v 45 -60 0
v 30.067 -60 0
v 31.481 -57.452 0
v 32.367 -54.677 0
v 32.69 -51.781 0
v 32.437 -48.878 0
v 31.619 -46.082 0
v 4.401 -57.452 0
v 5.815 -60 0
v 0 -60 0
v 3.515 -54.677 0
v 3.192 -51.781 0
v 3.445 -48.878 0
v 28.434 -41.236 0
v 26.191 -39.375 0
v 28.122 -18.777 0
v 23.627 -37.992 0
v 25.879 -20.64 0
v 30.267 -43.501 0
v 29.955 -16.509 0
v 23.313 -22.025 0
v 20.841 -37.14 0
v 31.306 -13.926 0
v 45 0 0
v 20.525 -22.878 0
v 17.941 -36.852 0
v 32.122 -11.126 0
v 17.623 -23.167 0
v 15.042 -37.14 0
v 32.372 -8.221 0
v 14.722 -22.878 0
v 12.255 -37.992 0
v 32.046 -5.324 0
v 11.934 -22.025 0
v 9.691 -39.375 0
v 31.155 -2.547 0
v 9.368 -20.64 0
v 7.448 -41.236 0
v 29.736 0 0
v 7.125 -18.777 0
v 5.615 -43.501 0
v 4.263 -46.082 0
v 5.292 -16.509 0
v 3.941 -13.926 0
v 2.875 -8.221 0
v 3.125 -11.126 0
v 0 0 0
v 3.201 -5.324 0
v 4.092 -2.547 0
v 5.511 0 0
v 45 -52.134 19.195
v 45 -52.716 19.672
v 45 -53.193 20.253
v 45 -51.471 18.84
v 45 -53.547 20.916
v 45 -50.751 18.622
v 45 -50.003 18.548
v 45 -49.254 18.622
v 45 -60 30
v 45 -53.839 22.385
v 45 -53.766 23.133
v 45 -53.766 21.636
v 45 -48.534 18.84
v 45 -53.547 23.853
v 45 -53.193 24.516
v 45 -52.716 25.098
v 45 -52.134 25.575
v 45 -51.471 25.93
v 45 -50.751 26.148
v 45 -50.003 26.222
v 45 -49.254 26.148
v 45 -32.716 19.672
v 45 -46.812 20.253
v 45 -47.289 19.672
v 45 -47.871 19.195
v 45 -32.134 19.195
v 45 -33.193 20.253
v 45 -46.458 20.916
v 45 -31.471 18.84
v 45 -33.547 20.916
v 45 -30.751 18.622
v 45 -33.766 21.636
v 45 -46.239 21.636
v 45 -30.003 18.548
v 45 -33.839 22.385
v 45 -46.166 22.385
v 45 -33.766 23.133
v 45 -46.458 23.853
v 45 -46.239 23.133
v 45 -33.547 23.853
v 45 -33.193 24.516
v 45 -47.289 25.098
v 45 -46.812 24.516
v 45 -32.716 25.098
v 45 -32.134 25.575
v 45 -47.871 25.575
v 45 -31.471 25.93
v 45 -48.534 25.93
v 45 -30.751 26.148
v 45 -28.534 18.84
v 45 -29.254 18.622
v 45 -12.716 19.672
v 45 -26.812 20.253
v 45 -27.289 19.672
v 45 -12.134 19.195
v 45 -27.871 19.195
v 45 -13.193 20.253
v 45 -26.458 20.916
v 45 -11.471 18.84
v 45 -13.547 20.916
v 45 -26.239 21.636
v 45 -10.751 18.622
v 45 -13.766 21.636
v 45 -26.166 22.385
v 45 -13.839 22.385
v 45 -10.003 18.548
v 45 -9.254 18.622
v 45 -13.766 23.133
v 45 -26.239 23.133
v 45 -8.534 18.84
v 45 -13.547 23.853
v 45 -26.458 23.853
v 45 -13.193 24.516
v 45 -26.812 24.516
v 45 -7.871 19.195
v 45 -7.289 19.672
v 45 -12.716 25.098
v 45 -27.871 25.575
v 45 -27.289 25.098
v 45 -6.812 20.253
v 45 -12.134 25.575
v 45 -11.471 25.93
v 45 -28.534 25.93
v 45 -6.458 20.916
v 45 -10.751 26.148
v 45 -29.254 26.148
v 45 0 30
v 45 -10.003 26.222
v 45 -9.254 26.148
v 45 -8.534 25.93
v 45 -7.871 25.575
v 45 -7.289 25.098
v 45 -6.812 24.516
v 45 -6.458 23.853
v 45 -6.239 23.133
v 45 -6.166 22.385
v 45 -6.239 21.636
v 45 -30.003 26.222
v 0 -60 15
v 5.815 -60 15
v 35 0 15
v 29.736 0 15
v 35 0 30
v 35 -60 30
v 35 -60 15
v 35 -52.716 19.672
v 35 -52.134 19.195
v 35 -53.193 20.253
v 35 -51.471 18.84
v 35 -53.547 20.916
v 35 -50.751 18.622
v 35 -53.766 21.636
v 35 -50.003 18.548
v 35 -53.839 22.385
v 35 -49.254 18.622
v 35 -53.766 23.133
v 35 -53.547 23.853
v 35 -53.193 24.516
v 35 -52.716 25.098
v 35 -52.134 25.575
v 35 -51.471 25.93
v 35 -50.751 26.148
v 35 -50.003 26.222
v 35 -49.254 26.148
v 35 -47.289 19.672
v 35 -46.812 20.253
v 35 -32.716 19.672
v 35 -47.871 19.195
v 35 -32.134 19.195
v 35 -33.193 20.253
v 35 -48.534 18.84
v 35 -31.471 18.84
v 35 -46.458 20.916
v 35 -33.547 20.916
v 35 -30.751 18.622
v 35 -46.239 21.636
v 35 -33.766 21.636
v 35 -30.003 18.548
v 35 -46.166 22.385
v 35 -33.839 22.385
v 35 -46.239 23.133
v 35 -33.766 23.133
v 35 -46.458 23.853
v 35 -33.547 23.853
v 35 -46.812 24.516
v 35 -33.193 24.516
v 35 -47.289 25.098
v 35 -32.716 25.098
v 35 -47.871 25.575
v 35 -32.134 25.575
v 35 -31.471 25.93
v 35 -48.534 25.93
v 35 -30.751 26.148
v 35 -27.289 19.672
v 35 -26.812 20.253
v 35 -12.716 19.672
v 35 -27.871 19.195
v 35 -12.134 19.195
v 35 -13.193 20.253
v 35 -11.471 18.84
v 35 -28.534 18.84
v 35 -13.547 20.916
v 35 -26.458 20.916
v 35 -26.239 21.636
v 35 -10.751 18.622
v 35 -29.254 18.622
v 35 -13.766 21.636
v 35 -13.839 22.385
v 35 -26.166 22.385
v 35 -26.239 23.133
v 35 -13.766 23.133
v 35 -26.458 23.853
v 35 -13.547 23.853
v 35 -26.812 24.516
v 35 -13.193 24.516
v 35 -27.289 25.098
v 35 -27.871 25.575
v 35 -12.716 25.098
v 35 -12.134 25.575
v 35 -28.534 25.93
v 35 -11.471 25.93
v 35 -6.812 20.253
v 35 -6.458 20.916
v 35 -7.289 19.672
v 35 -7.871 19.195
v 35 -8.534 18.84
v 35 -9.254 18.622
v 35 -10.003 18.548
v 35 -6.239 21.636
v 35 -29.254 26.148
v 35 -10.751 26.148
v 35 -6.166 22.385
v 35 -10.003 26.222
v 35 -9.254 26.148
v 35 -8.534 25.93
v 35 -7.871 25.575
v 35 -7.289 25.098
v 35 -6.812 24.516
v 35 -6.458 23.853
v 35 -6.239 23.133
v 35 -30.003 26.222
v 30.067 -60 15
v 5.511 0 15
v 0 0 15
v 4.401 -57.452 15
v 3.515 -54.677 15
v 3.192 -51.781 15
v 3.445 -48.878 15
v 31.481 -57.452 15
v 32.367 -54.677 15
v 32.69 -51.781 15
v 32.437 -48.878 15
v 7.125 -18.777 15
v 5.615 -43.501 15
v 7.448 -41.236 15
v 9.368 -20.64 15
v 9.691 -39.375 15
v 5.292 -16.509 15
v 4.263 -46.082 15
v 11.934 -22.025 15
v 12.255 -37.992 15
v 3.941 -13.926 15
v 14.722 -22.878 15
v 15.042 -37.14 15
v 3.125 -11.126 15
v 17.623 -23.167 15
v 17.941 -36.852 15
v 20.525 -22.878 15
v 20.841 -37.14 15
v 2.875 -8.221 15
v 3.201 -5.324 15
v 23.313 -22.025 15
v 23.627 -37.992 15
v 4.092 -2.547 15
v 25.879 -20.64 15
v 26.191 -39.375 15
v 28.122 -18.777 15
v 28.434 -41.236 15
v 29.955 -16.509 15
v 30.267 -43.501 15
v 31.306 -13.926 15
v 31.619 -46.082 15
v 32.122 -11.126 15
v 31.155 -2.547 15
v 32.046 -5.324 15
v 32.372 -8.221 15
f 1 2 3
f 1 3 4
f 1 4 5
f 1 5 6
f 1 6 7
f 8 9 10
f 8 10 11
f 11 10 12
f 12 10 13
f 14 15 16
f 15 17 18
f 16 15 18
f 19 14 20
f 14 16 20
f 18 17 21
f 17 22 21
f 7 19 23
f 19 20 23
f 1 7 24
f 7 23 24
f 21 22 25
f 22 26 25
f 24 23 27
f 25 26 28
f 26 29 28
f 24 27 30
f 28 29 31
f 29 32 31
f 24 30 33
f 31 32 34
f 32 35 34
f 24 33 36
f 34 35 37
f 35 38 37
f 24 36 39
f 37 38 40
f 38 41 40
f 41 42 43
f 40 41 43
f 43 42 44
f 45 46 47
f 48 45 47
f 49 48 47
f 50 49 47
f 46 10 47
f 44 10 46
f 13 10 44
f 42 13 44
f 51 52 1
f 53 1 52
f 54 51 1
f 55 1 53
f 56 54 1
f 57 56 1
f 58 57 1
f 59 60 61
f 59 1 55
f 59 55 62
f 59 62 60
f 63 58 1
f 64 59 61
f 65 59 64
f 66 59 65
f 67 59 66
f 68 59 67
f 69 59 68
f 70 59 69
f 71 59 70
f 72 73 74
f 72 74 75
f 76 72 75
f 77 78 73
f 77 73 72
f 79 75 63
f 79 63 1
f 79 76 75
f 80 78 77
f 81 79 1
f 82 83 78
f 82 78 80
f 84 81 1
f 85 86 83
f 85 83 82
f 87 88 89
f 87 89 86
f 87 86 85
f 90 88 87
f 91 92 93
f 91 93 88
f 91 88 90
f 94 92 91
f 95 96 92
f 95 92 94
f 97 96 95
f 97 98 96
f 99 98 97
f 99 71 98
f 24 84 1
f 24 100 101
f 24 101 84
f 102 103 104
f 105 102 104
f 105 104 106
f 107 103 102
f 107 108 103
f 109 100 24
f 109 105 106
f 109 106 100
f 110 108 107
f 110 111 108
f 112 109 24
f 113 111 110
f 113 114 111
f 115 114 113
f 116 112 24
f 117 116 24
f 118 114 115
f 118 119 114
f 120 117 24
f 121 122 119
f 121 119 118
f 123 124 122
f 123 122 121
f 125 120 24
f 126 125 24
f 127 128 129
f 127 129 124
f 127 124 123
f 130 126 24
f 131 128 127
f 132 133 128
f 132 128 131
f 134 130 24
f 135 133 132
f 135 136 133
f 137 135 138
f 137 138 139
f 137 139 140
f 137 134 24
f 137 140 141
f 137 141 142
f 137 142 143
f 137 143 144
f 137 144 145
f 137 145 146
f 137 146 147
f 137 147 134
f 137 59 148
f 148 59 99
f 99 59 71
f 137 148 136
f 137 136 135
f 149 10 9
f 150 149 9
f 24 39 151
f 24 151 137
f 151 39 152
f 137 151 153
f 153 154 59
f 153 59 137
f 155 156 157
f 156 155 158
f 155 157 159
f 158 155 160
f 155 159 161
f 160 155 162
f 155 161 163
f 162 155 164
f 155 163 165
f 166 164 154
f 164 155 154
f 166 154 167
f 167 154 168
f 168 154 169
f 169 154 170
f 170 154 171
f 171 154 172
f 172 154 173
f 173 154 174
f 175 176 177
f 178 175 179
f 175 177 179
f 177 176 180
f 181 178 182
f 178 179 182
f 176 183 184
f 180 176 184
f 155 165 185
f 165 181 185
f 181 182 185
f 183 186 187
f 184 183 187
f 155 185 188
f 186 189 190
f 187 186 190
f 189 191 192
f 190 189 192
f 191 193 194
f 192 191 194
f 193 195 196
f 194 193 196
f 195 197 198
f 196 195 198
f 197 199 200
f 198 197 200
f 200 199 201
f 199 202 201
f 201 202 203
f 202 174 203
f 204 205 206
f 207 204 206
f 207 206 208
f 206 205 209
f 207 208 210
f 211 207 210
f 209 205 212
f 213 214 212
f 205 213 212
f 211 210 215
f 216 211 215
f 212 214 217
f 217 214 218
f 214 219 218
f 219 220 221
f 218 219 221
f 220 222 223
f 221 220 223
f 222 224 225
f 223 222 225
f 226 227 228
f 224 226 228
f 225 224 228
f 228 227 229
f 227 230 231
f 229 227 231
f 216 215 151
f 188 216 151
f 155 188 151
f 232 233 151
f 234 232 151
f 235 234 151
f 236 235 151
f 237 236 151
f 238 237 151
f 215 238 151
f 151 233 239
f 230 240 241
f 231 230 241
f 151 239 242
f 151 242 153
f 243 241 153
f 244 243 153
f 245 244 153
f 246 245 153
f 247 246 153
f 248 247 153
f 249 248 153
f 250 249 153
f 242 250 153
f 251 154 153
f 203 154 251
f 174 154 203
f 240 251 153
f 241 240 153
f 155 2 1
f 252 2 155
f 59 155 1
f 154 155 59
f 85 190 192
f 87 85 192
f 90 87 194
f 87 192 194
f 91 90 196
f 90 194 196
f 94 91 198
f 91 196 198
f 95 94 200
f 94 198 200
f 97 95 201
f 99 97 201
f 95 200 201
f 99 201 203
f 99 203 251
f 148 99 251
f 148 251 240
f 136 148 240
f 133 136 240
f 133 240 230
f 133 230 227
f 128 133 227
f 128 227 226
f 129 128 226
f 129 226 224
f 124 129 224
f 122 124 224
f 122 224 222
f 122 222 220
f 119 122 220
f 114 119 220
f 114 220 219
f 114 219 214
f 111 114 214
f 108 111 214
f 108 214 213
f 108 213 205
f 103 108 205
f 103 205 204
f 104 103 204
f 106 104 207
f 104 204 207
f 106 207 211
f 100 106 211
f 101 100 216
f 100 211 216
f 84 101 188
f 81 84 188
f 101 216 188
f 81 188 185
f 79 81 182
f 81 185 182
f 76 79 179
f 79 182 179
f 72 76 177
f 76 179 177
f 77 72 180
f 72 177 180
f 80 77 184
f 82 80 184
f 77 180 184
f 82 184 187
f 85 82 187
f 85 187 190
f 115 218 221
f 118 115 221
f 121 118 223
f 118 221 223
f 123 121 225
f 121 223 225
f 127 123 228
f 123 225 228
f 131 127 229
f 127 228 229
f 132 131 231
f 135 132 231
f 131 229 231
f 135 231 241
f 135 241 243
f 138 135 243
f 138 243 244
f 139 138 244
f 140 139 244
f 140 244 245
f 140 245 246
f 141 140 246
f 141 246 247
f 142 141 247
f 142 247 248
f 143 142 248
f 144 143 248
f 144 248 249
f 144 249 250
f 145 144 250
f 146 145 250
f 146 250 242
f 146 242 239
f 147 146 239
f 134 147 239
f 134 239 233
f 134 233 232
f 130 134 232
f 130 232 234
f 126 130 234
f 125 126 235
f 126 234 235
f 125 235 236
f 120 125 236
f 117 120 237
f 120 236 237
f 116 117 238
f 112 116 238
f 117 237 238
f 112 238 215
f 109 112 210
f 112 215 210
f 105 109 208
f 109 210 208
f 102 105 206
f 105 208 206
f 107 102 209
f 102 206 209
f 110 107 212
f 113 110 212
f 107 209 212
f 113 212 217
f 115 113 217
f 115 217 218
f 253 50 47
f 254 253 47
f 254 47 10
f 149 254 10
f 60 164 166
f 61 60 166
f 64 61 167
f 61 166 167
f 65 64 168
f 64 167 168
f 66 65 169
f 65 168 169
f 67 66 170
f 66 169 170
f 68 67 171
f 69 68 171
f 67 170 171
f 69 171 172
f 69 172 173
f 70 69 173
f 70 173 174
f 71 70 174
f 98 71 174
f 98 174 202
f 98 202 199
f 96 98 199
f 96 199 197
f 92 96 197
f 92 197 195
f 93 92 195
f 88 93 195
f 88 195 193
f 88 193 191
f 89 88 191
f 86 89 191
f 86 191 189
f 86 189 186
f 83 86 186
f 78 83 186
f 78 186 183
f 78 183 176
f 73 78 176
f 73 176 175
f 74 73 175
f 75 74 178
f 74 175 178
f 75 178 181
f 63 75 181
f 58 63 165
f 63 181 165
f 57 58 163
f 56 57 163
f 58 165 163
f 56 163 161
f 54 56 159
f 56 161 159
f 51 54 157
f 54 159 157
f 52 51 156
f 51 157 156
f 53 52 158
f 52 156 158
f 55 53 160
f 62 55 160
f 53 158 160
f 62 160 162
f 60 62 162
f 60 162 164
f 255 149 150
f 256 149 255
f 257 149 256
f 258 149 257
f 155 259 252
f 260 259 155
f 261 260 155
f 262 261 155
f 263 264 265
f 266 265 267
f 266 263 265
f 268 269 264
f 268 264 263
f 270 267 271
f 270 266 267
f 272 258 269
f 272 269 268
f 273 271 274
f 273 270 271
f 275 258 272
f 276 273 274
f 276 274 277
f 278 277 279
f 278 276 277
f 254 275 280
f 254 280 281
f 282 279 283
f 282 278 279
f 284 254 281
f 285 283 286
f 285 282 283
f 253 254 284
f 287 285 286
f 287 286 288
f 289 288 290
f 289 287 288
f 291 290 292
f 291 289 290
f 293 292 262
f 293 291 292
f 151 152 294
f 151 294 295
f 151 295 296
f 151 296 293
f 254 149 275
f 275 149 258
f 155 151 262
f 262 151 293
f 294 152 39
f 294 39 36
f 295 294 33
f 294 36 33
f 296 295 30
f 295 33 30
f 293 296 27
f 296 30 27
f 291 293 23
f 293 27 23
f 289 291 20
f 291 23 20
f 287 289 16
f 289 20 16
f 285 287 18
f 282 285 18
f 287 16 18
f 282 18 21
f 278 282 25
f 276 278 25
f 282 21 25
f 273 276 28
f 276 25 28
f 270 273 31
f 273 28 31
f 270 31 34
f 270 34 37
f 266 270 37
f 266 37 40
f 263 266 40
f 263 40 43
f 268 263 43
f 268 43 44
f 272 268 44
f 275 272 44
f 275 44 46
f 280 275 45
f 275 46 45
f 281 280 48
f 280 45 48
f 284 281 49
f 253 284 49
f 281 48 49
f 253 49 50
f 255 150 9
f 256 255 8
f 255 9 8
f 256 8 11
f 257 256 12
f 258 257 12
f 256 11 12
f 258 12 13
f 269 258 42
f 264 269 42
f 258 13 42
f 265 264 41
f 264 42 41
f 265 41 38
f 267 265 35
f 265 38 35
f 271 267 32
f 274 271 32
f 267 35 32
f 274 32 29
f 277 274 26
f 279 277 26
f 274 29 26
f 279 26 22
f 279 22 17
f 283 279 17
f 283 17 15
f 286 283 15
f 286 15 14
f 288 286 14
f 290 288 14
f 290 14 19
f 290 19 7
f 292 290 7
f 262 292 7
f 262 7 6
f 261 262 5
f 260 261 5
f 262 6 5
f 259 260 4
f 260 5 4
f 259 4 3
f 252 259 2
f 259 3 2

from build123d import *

# Parameters (mm, degrees)
F1_DEPTH = 15
F2_W     = 60
F2_H     = 30
F3_DEPTH = 10
F4_R     = 3.836856
F5_DEPTH = 25


with BuildPart() as f1:
    # F0 (on Top) → F1 (new body)
    with BuildSketch(Plane.XY):
        with BuildLine():
            Line((5.510565, 0), (0, 0))
            Line((0, 0), (0, -60))
            Line((0, -60), (5.815111, -60))
            ThreePointArc((5.815111, -60), (17.941032, -36.85211), (30.066952, -60))
            Line((30.066952, -60), (35, -60))
            Line((35, -60), (35, 0))
            Line((35, 0), (29.736414, 0))
            ThreePointArc((29.736414, 0), (17.62349, -23.166624), (5.510565, 0))
        make_face()
    extrude(amount=F1_DEPTH)

    # F2 (on face) → F3 (join)
    with BuildSketch(Plane.YZ.offset(35)):
        with Locations((-30, 15)):
            Rectangle(F2_W, F2_H)
    extrude(amount=F3_DEPTH)

    # F4 (on face) → F5 (cut)
    with BuildSketch(Plane(origin=(35, 0, 0), x_dir=(0, -1, 0), z_dir=(-1, 0, 0))):
        with Locations((10.00252, 22.384789)):
            Circle(F4_R)
        with Locations((30.00252, 22.384789)):
            Circle(F4_R)
        with Locations((50.00252, 22.384789)):
            Circle(F4_R)
    extrude(amount=-F5_DEPTH, mode=Mode.SUBTRACT)


solid = f1.part
